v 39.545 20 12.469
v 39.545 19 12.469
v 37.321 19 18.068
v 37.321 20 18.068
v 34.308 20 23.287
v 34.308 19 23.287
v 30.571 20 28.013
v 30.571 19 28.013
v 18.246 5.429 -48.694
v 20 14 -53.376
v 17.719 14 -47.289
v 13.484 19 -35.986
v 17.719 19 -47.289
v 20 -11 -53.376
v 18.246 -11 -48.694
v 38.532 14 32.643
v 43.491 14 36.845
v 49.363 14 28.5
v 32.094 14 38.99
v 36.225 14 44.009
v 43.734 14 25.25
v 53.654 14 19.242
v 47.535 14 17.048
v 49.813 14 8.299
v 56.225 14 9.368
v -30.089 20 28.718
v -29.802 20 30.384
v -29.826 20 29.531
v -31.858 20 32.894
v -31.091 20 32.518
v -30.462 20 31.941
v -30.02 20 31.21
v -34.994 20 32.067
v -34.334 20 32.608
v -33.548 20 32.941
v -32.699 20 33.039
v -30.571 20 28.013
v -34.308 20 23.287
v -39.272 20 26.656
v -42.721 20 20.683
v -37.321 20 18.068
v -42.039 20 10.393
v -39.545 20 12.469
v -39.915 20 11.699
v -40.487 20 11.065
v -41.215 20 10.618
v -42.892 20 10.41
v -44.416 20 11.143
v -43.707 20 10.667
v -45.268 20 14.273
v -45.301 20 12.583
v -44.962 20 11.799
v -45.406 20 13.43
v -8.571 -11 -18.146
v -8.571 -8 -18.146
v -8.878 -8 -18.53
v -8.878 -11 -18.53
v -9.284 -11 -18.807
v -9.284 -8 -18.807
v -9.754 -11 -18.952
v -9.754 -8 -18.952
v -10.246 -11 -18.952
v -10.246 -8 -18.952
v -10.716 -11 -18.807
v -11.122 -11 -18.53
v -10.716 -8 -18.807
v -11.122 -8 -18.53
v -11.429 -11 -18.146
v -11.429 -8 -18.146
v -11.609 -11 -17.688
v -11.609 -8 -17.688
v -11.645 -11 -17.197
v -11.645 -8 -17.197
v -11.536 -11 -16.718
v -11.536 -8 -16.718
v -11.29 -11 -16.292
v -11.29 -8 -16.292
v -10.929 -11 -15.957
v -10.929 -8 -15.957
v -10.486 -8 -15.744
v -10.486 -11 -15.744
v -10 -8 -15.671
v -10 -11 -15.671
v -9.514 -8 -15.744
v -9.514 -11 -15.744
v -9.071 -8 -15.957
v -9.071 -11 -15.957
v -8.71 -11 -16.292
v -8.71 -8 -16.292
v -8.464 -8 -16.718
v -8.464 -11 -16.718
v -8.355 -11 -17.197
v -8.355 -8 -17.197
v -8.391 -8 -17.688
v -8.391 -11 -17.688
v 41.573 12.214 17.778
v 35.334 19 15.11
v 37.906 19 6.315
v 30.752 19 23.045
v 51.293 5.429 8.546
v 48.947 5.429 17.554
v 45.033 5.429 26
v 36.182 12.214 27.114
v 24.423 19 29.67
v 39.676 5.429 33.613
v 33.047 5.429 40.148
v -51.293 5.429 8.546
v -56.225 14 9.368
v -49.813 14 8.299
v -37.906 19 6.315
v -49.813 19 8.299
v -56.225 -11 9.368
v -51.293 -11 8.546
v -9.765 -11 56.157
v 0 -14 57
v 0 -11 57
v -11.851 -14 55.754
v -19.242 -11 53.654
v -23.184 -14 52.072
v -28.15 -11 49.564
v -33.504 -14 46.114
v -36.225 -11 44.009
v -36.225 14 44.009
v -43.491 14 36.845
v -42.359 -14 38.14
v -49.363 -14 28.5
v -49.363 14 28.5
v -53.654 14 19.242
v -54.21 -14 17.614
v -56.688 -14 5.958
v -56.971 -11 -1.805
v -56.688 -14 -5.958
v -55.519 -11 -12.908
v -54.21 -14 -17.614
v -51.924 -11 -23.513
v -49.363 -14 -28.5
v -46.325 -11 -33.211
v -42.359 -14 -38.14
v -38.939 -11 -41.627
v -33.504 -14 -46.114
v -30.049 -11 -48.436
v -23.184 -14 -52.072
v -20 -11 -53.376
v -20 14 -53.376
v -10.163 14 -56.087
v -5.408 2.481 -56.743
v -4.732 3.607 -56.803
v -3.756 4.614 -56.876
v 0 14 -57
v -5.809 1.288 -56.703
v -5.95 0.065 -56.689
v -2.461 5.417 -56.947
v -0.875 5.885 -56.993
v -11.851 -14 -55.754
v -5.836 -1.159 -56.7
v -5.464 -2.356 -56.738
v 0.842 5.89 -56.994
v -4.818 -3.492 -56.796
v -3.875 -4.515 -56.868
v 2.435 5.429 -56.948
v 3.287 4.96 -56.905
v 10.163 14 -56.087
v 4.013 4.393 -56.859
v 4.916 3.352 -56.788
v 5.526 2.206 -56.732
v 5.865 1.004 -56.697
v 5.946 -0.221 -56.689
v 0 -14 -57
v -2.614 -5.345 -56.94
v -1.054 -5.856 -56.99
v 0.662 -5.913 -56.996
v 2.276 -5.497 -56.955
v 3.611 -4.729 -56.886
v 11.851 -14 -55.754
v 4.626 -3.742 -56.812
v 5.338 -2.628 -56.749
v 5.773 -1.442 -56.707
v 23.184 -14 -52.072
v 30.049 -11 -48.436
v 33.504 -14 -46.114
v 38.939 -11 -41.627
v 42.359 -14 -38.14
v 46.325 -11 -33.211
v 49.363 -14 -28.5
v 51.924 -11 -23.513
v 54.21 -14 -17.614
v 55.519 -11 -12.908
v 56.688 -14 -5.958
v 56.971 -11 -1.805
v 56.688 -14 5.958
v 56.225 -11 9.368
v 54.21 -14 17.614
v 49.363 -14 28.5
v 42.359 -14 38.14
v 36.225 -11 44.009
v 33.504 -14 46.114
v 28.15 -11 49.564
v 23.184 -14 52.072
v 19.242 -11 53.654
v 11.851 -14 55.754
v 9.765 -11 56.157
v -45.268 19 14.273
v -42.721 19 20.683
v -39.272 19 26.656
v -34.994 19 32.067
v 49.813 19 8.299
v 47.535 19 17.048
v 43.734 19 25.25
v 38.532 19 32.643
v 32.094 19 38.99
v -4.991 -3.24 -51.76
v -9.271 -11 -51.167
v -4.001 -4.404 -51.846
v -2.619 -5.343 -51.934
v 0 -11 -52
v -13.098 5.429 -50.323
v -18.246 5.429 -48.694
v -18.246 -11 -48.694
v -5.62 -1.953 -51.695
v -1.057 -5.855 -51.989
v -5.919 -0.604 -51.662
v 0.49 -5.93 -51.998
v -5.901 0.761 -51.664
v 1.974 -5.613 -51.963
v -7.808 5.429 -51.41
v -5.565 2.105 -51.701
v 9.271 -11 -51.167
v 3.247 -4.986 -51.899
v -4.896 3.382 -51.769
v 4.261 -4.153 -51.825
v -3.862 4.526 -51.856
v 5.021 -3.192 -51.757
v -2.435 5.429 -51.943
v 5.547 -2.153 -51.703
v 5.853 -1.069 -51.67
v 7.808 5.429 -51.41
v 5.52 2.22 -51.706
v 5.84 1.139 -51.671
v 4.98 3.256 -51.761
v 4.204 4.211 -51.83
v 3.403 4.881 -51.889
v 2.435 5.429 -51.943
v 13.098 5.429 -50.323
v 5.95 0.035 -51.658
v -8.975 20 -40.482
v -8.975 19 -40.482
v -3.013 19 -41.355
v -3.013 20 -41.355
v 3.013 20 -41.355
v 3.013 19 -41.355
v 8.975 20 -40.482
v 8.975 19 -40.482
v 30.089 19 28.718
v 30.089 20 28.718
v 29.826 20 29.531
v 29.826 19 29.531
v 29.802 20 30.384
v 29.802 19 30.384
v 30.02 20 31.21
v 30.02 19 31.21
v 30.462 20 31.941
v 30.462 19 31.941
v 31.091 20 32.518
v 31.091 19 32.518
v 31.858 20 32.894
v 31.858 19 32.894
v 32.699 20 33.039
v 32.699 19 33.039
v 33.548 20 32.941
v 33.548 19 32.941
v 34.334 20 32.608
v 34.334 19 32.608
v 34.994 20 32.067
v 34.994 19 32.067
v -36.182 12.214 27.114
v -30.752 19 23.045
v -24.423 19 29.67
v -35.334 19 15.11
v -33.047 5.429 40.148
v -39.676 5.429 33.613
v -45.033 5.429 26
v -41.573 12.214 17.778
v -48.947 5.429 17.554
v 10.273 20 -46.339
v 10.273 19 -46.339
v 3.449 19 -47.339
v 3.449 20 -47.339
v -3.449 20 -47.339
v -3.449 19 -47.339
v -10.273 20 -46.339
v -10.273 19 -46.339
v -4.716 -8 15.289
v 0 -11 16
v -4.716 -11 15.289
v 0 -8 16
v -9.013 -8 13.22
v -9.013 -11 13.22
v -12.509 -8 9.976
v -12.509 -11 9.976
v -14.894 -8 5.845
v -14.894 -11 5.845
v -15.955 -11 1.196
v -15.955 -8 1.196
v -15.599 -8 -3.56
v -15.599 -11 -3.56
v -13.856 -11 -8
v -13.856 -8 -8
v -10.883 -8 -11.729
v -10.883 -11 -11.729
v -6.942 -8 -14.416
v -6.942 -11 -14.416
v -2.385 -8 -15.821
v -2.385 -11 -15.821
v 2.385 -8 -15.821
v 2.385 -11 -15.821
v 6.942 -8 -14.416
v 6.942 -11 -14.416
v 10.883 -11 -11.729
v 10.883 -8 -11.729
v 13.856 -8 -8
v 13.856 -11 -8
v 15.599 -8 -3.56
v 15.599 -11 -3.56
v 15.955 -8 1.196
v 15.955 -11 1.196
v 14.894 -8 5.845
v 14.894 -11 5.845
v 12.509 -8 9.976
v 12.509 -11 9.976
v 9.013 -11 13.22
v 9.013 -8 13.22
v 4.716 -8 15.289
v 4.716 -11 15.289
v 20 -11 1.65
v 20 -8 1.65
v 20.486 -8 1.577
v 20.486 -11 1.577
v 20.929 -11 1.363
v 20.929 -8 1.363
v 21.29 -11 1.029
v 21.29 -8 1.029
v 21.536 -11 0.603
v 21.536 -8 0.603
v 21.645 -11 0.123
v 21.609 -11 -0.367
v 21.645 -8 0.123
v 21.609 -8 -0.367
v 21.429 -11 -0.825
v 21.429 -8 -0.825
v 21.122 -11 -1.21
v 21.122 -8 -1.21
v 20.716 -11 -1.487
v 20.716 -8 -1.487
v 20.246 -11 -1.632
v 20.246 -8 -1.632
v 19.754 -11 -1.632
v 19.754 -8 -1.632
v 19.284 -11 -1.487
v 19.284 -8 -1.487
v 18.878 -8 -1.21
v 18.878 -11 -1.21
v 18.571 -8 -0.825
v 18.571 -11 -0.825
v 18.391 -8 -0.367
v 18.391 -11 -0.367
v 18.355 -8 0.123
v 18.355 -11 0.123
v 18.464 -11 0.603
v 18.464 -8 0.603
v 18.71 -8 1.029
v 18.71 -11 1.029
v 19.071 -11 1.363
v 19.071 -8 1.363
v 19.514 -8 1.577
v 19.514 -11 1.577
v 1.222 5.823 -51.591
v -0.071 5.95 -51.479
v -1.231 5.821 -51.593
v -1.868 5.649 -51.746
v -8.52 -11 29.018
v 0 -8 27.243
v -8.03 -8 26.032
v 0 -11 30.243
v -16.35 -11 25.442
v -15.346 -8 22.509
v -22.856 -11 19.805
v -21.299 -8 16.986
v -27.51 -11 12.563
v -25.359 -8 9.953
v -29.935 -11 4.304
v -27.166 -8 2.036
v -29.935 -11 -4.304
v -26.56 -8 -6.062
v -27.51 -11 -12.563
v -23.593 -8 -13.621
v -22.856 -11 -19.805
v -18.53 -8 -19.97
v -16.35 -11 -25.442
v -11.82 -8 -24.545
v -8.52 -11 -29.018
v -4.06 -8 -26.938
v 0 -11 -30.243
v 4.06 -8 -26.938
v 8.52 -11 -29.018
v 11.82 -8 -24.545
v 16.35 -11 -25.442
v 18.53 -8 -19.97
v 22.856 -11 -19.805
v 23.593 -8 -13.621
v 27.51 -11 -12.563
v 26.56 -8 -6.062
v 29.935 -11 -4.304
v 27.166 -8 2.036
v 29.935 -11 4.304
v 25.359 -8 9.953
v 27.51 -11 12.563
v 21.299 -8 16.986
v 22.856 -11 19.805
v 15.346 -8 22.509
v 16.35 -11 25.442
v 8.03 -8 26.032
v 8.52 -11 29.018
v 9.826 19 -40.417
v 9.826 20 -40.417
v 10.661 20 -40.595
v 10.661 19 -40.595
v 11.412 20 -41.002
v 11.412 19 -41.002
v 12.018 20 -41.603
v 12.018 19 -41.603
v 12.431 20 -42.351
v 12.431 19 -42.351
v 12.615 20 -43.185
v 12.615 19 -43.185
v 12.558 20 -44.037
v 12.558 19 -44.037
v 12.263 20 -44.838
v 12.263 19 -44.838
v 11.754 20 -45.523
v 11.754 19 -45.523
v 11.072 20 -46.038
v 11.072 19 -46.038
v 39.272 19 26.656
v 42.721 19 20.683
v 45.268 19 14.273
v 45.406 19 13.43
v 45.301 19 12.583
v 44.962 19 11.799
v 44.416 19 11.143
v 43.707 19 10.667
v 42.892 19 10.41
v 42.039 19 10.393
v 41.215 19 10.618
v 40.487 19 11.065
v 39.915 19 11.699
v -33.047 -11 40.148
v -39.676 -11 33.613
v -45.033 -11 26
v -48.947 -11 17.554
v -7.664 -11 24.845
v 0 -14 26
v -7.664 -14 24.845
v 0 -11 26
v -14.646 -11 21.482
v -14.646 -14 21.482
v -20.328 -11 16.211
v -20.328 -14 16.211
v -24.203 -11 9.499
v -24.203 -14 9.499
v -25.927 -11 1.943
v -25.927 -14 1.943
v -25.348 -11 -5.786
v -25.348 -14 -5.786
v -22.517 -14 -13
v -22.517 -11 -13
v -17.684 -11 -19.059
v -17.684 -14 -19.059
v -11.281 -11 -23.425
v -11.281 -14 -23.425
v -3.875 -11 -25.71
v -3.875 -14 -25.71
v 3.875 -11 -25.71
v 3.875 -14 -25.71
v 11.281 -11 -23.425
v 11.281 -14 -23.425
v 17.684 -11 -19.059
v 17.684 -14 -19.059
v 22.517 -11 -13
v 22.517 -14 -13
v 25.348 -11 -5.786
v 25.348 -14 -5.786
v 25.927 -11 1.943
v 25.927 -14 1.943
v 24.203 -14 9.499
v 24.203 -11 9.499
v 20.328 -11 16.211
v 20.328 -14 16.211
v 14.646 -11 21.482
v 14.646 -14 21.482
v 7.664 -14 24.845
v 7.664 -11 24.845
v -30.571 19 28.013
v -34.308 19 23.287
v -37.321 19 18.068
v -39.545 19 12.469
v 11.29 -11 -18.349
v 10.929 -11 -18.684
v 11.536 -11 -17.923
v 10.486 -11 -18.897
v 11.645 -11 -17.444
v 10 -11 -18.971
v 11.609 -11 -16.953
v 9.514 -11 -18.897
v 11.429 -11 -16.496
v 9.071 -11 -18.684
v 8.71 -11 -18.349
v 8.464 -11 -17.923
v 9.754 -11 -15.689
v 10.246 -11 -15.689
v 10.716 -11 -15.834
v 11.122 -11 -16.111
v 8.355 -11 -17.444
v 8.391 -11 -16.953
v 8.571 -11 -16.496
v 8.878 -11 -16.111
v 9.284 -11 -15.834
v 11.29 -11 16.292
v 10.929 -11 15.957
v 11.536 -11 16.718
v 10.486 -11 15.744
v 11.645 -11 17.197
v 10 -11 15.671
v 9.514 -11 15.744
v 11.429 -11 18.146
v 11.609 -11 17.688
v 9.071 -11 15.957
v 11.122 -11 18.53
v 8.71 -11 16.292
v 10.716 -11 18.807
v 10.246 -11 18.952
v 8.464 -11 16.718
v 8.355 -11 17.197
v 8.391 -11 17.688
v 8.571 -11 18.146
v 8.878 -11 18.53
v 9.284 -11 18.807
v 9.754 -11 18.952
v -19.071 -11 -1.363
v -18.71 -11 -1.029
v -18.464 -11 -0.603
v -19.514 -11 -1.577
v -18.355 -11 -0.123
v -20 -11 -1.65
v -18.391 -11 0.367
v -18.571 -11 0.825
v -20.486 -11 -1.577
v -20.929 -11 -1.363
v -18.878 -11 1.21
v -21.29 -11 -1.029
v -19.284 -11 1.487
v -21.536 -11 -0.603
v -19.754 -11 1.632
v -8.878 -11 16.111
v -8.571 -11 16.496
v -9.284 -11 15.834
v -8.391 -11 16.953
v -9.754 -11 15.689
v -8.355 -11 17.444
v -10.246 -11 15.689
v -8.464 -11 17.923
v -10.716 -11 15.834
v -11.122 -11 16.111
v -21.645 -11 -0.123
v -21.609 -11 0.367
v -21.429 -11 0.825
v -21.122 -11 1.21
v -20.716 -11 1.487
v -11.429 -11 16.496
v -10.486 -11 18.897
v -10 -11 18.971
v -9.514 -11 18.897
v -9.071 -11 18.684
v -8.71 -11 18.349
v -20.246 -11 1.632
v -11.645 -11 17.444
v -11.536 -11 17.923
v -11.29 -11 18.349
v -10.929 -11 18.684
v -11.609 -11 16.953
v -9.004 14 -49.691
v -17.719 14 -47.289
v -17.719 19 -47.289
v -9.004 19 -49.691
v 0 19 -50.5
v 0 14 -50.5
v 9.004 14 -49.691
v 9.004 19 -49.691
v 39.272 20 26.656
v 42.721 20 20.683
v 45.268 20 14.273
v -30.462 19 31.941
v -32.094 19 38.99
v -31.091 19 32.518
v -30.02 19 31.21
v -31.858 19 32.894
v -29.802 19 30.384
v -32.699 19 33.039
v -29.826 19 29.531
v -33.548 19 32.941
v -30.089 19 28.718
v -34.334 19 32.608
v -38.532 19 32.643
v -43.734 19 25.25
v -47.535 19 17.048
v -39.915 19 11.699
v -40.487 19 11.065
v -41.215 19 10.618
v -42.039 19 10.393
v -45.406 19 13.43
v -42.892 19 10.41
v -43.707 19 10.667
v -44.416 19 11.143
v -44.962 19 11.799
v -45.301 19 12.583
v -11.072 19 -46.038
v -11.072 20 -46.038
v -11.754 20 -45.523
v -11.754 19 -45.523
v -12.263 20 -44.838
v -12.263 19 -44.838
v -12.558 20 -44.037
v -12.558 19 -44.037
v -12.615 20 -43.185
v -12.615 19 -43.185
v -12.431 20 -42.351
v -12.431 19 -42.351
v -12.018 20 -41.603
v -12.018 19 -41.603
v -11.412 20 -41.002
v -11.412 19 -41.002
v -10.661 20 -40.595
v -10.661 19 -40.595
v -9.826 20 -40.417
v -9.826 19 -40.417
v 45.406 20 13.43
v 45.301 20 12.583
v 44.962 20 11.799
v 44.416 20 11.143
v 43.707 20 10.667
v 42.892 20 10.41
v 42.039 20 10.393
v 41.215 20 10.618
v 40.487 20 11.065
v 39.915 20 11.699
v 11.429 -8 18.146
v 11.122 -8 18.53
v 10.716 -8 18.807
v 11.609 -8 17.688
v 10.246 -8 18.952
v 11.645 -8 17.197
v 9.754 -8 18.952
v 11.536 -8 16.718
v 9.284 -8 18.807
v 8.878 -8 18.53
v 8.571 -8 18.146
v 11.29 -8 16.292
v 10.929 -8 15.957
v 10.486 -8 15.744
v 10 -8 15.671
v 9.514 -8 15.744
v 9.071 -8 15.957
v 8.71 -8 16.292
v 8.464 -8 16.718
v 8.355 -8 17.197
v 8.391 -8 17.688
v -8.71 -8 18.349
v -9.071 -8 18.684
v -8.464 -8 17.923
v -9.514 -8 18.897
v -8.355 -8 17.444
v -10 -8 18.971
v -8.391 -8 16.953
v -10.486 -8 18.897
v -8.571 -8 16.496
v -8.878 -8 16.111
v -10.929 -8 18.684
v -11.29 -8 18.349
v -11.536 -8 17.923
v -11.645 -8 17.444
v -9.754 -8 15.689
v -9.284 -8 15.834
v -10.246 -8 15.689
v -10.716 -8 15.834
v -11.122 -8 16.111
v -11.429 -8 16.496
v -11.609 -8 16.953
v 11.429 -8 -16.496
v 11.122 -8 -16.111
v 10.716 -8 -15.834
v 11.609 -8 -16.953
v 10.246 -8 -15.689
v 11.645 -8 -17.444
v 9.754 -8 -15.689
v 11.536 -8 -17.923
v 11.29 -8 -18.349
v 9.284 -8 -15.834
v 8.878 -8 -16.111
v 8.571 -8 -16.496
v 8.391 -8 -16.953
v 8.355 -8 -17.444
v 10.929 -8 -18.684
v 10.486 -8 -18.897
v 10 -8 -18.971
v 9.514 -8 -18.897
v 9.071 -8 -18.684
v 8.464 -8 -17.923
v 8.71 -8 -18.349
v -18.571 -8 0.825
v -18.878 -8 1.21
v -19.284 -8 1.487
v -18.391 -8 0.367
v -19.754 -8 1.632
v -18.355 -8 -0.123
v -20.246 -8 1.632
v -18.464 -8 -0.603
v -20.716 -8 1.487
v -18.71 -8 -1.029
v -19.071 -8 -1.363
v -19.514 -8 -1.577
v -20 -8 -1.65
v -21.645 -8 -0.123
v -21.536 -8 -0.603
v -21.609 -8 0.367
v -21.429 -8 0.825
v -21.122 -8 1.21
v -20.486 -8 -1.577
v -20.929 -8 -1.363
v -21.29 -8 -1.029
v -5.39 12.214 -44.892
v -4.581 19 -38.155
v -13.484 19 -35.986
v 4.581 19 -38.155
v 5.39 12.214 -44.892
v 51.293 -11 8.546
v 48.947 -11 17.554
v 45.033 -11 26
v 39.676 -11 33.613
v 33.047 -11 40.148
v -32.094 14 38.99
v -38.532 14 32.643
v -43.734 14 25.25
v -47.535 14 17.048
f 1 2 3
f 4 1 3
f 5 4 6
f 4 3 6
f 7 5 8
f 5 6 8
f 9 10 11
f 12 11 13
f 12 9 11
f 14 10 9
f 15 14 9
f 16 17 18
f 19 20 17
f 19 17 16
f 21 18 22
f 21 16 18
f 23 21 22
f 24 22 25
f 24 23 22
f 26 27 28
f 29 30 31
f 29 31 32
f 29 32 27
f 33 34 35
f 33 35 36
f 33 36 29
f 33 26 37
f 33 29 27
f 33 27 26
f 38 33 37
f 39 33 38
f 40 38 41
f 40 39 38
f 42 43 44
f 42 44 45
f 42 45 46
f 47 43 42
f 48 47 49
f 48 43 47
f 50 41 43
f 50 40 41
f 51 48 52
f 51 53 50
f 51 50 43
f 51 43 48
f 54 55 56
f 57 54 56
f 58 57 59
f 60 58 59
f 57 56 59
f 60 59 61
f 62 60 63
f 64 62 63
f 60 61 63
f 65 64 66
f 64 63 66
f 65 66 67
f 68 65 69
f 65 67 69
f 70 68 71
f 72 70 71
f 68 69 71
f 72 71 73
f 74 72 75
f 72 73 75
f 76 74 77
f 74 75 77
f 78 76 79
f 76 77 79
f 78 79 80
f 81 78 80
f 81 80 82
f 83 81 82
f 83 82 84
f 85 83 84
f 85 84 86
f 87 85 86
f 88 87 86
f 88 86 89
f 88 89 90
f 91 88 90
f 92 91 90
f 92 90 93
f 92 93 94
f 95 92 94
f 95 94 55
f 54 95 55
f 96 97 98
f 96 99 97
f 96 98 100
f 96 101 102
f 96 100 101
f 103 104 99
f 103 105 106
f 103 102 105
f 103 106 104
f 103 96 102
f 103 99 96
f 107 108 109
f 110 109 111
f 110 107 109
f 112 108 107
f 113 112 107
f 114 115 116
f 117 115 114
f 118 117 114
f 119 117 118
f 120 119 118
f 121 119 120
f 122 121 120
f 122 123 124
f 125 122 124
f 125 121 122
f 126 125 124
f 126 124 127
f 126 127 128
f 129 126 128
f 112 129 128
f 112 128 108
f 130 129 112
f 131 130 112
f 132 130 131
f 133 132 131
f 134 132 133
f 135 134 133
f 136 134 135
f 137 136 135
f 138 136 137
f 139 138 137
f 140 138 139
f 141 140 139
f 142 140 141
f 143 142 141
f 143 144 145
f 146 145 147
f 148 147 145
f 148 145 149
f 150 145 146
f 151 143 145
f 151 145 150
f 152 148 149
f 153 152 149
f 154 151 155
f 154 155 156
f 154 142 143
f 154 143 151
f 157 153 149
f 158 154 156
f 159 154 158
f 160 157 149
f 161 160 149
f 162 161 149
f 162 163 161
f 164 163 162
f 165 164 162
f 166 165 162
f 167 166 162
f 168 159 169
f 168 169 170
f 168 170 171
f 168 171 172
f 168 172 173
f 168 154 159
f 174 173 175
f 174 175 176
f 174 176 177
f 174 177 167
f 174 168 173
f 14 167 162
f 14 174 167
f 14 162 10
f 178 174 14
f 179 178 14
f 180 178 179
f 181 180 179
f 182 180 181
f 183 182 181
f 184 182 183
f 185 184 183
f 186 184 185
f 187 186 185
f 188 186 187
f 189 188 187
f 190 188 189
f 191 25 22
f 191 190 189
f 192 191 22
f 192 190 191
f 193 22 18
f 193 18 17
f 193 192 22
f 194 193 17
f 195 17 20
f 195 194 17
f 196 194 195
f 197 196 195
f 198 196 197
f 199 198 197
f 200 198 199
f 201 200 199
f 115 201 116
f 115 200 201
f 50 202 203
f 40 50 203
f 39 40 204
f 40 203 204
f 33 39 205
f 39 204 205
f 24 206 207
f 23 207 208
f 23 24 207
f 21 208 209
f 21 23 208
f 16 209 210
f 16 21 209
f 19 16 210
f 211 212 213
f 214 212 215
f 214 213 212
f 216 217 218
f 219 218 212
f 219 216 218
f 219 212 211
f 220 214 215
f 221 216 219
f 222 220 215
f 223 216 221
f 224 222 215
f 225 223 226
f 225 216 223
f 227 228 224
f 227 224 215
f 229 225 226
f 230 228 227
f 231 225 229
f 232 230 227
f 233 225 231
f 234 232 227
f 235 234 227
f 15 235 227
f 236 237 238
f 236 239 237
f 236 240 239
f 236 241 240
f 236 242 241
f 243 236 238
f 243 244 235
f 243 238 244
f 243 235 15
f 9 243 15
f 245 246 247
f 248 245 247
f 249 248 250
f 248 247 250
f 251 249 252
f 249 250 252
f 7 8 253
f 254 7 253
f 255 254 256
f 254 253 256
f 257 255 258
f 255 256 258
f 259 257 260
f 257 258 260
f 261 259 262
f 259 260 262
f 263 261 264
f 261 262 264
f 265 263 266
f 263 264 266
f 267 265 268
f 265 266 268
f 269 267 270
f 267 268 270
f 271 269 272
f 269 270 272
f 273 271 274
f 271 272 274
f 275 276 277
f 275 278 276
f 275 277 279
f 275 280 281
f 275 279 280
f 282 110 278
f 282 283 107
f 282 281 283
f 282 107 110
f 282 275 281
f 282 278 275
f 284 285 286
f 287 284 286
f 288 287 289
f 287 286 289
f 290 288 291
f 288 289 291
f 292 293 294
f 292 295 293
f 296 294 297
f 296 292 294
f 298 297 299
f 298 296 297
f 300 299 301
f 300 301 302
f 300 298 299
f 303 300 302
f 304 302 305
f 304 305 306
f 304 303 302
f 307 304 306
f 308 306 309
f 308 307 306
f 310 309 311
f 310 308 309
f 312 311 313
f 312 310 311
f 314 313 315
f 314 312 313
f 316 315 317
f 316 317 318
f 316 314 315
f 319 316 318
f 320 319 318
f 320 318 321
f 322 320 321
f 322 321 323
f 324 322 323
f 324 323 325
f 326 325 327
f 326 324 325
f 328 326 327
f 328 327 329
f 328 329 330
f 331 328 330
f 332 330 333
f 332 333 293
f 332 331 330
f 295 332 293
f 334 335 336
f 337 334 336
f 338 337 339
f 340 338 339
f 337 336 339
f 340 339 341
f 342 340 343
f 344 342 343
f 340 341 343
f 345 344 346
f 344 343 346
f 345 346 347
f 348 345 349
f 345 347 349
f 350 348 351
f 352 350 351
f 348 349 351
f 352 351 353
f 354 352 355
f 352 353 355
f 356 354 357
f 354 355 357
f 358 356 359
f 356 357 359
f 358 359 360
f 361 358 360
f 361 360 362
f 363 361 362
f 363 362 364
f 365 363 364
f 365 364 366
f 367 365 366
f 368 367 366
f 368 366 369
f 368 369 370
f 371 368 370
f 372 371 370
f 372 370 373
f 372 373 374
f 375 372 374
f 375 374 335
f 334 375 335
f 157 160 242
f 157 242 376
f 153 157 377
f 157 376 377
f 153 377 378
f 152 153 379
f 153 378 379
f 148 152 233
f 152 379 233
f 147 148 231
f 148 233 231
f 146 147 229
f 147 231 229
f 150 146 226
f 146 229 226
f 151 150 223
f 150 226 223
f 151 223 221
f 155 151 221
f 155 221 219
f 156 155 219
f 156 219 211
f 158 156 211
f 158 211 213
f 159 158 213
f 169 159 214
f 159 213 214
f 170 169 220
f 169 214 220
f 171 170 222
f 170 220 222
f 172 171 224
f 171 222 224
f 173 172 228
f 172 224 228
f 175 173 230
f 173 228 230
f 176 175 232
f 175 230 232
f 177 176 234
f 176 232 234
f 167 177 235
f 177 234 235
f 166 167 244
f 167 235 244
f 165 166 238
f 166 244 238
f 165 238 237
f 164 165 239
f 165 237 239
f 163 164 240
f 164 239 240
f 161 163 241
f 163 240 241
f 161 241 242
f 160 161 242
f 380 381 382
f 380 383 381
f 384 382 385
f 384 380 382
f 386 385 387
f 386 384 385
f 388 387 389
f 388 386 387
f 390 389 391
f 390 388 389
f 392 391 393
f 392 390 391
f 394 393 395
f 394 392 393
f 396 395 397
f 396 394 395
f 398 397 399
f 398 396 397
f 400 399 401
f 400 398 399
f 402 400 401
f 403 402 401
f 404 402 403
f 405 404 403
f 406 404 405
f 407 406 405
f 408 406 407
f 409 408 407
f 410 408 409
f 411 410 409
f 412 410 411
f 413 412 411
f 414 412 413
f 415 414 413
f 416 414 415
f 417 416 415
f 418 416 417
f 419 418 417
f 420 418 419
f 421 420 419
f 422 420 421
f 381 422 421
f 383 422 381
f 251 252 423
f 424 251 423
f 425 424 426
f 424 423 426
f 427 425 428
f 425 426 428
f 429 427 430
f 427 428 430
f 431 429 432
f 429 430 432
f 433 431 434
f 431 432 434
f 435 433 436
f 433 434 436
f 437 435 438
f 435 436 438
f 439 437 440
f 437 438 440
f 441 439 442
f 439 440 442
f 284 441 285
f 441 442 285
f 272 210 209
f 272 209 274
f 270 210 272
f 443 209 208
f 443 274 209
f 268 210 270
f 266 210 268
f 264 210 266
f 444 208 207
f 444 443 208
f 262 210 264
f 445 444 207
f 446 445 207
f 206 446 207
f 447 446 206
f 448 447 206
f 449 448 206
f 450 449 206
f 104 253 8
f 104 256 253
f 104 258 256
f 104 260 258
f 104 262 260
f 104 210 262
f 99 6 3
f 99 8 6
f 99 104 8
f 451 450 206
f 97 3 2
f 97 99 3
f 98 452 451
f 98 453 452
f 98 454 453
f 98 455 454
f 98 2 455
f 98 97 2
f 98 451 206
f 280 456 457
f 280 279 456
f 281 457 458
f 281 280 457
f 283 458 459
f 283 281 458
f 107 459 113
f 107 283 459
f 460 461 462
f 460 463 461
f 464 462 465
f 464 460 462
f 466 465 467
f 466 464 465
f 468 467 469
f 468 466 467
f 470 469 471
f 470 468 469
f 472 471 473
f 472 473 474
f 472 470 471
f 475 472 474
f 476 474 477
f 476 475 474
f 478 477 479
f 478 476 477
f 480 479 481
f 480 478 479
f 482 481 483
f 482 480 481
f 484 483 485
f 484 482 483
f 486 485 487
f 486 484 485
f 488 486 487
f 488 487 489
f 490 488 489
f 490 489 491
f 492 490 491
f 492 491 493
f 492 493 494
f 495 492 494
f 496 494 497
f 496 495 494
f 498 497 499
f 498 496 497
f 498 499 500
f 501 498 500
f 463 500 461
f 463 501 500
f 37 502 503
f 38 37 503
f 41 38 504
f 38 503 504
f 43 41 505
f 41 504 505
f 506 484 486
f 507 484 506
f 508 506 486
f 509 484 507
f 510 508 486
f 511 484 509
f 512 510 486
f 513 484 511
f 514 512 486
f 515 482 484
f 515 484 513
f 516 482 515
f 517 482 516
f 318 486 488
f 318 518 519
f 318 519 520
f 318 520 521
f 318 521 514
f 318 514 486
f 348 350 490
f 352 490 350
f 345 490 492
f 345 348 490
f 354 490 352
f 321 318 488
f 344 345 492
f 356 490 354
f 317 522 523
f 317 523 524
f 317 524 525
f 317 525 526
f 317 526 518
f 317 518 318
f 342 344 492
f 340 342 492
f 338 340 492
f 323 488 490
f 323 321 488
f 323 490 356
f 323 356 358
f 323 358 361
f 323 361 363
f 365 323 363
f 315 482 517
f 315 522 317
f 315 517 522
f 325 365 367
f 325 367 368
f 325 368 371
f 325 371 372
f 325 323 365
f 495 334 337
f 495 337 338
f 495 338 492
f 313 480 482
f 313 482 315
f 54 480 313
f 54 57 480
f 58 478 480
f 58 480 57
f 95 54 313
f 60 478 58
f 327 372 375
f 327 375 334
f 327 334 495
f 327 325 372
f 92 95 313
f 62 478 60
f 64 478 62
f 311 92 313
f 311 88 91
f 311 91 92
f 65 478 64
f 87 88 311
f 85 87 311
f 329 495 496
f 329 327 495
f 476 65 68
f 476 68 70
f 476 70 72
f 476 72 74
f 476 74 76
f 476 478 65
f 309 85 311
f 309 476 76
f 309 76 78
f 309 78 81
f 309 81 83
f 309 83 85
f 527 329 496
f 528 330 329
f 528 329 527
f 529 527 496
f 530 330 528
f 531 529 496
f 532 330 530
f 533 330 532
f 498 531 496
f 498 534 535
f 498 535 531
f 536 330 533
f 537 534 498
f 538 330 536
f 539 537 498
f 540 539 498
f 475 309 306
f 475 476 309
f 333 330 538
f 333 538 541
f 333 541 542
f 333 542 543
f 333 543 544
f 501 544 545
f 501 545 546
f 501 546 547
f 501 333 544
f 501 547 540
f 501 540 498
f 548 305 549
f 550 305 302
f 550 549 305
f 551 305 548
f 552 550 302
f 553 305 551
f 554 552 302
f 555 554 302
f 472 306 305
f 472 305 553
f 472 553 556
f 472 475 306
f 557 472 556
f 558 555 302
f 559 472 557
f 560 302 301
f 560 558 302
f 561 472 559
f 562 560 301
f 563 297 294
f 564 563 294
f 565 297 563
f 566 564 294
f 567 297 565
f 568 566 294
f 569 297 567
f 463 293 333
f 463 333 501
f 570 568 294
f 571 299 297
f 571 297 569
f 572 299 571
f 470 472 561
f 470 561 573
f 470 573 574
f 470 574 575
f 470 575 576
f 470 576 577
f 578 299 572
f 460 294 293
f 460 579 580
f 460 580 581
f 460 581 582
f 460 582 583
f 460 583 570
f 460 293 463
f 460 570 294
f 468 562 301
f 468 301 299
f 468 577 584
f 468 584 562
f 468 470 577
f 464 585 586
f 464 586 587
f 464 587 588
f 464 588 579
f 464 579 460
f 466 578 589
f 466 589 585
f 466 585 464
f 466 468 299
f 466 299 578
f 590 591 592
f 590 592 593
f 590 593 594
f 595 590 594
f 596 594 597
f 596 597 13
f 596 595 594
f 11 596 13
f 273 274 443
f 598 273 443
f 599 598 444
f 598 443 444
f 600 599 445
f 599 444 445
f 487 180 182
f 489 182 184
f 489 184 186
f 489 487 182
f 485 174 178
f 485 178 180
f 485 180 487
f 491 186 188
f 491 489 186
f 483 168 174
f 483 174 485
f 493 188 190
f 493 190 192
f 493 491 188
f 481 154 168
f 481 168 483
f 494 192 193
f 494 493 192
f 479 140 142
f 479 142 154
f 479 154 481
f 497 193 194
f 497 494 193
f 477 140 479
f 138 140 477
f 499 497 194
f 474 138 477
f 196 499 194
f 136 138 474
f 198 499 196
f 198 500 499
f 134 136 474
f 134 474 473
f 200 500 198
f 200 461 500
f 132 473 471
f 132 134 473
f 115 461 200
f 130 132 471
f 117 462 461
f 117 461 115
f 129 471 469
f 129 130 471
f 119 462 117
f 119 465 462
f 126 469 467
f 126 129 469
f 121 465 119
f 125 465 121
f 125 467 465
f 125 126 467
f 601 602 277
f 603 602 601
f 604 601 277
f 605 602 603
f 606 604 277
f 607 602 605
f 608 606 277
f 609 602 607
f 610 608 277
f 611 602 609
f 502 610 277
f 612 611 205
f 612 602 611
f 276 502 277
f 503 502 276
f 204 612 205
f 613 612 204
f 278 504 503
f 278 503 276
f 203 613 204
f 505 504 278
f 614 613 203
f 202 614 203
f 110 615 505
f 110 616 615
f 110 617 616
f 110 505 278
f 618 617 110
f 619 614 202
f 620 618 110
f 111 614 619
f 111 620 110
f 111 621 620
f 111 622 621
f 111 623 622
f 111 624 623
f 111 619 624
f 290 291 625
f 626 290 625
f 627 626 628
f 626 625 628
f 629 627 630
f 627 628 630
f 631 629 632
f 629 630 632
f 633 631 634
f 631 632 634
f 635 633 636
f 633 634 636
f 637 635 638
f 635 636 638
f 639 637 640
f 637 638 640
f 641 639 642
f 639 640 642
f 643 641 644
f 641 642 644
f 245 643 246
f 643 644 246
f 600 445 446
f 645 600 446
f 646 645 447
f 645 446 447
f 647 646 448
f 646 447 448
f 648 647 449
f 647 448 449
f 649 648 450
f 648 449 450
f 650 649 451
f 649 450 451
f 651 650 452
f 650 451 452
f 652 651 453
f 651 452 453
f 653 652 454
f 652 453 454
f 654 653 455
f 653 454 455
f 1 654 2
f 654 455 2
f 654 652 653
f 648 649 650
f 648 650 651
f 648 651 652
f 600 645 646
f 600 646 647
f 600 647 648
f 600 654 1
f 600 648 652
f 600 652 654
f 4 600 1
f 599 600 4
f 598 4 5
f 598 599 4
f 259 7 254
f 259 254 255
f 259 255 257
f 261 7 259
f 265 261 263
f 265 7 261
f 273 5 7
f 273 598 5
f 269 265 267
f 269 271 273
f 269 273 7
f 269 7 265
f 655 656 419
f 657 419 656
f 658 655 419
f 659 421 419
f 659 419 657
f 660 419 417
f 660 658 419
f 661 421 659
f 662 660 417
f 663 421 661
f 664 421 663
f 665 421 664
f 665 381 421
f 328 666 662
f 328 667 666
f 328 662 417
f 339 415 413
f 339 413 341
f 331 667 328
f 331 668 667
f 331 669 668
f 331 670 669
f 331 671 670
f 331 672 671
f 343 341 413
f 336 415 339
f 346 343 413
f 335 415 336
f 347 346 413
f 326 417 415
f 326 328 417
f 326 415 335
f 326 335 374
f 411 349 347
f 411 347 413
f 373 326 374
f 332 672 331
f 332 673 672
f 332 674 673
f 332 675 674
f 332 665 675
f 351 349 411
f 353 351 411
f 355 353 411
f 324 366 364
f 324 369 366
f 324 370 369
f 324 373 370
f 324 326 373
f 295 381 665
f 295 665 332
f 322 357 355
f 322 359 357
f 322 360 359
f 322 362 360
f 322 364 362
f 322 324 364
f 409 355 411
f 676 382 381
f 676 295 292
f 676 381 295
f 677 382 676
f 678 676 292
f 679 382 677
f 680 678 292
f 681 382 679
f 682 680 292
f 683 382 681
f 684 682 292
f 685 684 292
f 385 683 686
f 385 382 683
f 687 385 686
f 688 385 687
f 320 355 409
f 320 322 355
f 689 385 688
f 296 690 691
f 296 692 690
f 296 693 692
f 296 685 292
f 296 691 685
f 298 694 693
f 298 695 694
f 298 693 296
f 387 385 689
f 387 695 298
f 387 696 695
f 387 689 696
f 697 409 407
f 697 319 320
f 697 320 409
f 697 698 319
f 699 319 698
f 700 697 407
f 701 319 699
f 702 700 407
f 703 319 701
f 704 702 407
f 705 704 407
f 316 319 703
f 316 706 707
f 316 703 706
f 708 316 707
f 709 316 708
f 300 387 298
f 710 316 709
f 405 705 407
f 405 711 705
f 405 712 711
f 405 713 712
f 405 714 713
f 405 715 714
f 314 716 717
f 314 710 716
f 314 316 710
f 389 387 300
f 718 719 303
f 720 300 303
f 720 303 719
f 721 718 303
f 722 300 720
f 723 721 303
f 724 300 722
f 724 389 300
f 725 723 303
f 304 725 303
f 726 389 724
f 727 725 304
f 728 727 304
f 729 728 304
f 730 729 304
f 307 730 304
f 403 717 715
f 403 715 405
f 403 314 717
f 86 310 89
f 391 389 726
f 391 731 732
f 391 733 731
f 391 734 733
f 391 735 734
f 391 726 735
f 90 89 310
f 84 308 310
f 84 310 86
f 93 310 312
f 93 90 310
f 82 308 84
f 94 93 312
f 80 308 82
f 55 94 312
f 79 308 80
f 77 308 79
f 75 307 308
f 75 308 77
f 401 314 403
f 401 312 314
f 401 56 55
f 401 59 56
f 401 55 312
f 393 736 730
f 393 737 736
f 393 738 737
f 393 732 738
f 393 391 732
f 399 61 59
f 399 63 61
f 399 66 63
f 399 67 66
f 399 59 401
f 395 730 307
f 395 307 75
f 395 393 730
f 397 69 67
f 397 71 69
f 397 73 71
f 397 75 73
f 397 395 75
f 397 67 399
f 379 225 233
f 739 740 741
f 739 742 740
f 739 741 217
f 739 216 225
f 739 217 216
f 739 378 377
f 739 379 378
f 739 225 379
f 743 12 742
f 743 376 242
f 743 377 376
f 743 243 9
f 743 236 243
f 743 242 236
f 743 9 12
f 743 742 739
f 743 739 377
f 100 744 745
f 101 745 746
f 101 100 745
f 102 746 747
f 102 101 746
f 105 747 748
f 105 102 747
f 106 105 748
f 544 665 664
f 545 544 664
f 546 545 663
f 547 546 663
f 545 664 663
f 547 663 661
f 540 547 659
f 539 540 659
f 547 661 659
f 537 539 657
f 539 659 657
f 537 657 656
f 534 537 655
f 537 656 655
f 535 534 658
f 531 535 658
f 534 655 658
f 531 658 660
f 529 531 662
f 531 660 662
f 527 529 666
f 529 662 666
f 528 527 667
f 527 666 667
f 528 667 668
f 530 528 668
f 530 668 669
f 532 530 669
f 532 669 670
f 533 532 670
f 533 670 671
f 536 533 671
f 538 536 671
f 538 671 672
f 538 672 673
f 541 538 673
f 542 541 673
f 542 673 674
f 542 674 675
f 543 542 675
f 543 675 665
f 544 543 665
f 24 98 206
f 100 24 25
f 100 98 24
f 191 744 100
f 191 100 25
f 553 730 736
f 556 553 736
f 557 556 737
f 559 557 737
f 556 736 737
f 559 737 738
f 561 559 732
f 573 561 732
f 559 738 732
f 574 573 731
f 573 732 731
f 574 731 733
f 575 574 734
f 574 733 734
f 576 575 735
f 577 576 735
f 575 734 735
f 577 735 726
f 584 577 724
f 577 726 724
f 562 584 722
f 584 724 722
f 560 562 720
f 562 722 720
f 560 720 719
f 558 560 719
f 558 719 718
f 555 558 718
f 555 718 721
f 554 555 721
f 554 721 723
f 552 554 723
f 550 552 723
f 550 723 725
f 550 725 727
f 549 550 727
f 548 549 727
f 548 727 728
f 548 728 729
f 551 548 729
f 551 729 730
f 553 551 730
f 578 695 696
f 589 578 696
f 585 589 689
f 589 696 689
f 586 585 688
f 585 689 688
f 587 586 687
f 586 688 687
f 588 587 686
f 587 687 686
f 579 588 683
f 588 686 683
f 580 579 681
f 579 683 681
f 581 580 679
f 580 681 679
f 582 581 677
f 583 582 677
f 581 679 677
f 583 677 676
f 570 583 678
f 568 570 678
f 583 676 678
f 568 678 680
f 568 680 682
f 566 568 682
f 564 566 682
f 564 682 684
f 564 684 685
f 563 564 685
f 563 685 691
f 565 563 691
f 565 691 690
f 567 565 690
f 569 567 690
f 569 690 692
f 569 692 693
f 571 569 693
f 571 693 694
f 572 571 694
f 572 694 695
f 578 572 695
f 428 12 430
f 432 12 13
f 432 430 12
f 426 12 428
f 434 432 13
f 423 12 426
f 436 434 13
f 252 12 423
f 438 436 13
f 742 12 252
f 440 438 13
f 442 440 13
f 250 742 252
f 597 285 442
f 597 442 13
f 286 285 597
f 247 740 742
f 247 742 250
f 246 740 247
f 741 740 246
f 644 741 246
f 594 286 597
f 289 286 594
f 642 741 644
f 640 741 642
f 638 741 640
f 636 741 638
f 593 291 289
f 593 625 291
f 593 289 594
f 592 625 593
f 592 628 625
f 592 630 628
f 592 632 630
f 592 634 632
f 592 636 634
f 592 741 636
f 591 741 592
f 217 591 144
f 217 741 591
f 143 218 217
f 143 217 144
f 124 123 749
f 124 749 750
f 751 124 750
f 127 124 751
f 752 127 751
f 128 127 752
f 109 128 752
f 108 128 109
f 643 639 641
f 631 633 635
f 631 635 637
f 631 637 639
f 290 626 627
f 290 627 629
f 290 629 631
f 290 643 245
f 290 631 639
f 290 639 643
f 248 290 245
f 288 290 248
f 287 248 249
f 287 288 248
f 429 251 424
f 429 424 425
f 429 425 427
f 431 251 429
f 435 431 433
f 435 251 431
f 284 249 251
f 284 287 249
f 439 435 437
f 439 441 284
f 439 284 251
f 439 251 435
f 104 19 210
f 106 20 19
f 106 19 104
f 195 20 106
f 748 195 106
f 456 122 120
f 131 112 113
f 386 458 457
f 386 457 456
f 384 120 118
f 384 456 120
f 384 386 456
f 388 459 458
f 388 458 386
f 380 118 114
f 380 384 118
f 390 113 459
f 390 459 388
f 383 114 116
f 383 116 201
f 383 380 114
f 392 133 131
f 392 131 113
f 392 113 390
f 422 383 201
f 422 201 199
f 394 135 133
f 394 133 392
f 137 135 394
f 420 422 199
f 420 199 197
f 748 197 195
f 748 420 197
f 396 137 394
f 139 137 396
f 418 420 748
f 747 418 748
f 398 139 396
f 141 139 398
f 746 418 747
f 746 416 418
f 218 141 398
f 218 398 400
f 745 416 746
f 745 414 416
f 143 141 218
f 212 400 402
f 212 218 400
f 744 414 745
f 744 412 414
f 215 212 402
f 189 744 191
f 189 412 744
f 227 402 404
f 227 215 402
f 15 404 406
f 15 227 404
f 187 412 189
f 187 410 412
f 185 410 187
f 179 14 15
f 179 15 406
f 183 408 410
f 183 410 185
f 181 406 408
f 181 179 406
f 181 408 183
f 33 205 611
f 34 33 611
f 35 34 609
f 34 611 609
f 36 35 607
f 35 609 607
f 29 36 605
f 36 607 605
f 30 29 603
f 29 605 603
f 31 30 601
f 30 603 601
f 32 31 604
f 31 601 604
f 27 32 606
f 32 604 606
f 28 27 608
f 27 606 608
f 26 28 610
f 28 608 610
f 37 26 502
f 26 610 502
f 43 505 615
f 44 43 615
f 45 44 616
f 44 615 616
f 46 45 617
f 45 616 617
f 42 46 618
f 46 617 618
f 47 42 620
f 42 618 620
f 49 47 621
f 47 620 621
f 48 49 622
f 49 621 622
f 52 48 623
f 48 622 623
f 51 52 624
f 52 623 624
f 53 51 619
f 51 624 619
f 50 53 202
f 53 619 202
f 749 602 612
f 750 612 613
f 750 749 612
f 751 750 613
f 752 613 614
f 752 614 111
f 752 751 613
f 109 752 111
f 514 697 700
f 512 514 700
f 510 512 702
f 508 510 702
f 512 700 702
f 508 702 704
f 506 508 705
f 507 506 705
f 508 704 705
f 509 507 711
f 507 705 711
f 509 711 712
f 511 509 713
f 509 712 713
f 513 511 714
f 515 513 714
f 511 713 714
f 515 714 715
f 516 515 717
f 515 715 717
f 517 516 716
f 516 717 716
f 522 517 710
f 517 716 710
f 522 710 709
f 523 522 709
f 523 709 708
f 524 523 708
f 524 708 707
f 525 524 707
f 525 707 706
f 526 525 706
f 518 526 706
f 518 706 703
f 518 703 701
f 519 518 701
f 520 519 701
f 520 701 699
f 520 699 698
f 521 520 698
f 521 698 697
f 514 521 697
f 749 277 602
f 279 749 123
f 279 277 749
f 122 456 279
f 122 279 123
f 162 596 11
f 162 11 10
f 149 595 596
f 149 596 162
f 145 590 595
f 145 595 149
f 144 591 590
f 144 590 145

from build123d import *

# Parameters (mm, degrees)
CUT_EXTRUDE1_DEPTH  = 87.011627121
CIRPATTERN1_COUNT   = 3
BOSS_EXTRUDE1_DEPTH = 1
CIRPATTERN2_COUNT   = 3
SKETCH4_R           = 1.65
CUT_EXTRUDE2_DEPTH  = 86.334635407
CIRPATTERN3_COUNT   = 6
SKETCH5_R           = 5.95
CUT_EXTRUDE3_DEPTH  = 84.054199171


with BuildPart() as part:
    # Sketch1 → Revolve1 (revolve)
    with BuildSketch(Plane.XY, mode=Mode.PRIVATE) as revolve1_sk:
        Polygon((50.5, 19), (50.5, 14), (57, 14), (57, -14), (26, -14), (26, -11), (16, -11), (16, -8), (27.242640687, -8), (30.242640687, -11), (52, -11), (52, 5.428932188), (38.428932188, 19), align=None)
    revolve(revolve1_sk.sketch.rotate(Axis((0, 34.277777778, 0), (0, -1, 0)), 90), axis=Axis((0, 34.277777778, 0), (0, -1, 0)))

    # Sketch2 → Cut-Extrude1 (cut, through all)
    with BuildSketch(Plane(origin=(0, -11, 0), x_dir=(1, 0, 0), z_dir=(0, 1, 0))):
        with BuildLine():
            Line((20, 53.37602458), (12.98245614, 34.647594903))
            ThreePointArc((12.98245614, 34.647594903), (32.04293994, 18.5), (36.496925436, -6.08066063))
            Line((36.496925436, -6.08066063), (56.22499324, -9.367504214))
            ThreePointArc((56.22499324, -9.367504214), (49.363448016, 28.5), (20, 53.37602458))
        make_face()
    cut_extrude1 = extrude(amount=CUT_EXTRUDE1_DEPTH, mode=Mode.SUBTRACT)

    # CirPattern1: Cut-Extrude1 ×3 about axis
    cirpattern1_axis = Axis((0, 0, 0), (0, 1, 0))
    for i in range(1, CIRPATTERN1_COUNT):
        add(cut_extrude1.rotate(cirpattern1_axis, i * 360 / CIRPATTERN1_COUNT), mode=Mode.SUBTRACT)

    # Sketch3 → Boss-Extrude1 (add)
    with BuildSketch(Plane(origin=(0, 19, 0), x_dir=(1, 0, 0), z_dir=(0, 1, 0))):
        with BuildLine():
            ThreePointArc((10.273190717, 46.339368728), (0, 47.464466094), (-10.273190717, 46.339368728))
            ThreePointArc((-10.273190717, 46.339368728), (-12.552759897, 42.761161865), (-8.974553034, 40.481592685))
            ThreePointArc((-8.974553034, 40.481592685), (0, 41.464466094), (8.974553034, 40.481592685))
            ThreePointArc((8.974553034, 40.481592685), (12.552759897, 42.761161865), (10.273190717, 46.339368728))
        make_face()
    boss_extrude1 = extrude(amount=BOSS_EXTRUDE1_DEPTH)

    # CirPattern2: Boss-Extrude1 ×3 about axis
    cirpattern2_axis = Axis((0, 0, 0), (0, 1, 0))
    for i in range(1, CIRPATTERN2_COUNT):
        add(boss_extrude1.rotate(cirpattern2_axis, i * 360 / CIRPATTERN2_COUNT))

    # Sketch4 → Cut-Extrude2 (cut, through all)
    with BuildSketch(Plane(origin=(0, -8, 0), x_dir=(1, 0, 0), z_dir=(0, 1, 0))):
        with Locations(Location((20, 0, 0), (0, 0, 270))):
            Circle(SKETCH4_R)
    cut_extrude2 = extrude(amount=-CUT_EXTRUDE2_DEPTH, mode=Mode.SUBTRACT)

    # CirPattern3: Cut-Extrude2 ×6 about axis
    cirpattern3_axis = Axis((0, 0, 0), (0, 1, 0))
    for i in range(1, CIRPATTERN3_COUNT):
        add(cut_extrude2.rotate(cirpattern3_axis, i * 360 / CIRPATTERN3_COUNT), mode=Mode.SUBTRACT)

    # Sketch5 → Cut-Extrude3 (cut, through all)
    with BuildSketch(Plane.XY):
        with Locations(Location((0, 0, 0), (0, 0, 65.842722295))):
            Circle(SKETCH5_R)
    extrude(amount=-CUT_EXTRUDE3_DEPTH, mode=Mode.SUBTRACT)


solid = part.part
